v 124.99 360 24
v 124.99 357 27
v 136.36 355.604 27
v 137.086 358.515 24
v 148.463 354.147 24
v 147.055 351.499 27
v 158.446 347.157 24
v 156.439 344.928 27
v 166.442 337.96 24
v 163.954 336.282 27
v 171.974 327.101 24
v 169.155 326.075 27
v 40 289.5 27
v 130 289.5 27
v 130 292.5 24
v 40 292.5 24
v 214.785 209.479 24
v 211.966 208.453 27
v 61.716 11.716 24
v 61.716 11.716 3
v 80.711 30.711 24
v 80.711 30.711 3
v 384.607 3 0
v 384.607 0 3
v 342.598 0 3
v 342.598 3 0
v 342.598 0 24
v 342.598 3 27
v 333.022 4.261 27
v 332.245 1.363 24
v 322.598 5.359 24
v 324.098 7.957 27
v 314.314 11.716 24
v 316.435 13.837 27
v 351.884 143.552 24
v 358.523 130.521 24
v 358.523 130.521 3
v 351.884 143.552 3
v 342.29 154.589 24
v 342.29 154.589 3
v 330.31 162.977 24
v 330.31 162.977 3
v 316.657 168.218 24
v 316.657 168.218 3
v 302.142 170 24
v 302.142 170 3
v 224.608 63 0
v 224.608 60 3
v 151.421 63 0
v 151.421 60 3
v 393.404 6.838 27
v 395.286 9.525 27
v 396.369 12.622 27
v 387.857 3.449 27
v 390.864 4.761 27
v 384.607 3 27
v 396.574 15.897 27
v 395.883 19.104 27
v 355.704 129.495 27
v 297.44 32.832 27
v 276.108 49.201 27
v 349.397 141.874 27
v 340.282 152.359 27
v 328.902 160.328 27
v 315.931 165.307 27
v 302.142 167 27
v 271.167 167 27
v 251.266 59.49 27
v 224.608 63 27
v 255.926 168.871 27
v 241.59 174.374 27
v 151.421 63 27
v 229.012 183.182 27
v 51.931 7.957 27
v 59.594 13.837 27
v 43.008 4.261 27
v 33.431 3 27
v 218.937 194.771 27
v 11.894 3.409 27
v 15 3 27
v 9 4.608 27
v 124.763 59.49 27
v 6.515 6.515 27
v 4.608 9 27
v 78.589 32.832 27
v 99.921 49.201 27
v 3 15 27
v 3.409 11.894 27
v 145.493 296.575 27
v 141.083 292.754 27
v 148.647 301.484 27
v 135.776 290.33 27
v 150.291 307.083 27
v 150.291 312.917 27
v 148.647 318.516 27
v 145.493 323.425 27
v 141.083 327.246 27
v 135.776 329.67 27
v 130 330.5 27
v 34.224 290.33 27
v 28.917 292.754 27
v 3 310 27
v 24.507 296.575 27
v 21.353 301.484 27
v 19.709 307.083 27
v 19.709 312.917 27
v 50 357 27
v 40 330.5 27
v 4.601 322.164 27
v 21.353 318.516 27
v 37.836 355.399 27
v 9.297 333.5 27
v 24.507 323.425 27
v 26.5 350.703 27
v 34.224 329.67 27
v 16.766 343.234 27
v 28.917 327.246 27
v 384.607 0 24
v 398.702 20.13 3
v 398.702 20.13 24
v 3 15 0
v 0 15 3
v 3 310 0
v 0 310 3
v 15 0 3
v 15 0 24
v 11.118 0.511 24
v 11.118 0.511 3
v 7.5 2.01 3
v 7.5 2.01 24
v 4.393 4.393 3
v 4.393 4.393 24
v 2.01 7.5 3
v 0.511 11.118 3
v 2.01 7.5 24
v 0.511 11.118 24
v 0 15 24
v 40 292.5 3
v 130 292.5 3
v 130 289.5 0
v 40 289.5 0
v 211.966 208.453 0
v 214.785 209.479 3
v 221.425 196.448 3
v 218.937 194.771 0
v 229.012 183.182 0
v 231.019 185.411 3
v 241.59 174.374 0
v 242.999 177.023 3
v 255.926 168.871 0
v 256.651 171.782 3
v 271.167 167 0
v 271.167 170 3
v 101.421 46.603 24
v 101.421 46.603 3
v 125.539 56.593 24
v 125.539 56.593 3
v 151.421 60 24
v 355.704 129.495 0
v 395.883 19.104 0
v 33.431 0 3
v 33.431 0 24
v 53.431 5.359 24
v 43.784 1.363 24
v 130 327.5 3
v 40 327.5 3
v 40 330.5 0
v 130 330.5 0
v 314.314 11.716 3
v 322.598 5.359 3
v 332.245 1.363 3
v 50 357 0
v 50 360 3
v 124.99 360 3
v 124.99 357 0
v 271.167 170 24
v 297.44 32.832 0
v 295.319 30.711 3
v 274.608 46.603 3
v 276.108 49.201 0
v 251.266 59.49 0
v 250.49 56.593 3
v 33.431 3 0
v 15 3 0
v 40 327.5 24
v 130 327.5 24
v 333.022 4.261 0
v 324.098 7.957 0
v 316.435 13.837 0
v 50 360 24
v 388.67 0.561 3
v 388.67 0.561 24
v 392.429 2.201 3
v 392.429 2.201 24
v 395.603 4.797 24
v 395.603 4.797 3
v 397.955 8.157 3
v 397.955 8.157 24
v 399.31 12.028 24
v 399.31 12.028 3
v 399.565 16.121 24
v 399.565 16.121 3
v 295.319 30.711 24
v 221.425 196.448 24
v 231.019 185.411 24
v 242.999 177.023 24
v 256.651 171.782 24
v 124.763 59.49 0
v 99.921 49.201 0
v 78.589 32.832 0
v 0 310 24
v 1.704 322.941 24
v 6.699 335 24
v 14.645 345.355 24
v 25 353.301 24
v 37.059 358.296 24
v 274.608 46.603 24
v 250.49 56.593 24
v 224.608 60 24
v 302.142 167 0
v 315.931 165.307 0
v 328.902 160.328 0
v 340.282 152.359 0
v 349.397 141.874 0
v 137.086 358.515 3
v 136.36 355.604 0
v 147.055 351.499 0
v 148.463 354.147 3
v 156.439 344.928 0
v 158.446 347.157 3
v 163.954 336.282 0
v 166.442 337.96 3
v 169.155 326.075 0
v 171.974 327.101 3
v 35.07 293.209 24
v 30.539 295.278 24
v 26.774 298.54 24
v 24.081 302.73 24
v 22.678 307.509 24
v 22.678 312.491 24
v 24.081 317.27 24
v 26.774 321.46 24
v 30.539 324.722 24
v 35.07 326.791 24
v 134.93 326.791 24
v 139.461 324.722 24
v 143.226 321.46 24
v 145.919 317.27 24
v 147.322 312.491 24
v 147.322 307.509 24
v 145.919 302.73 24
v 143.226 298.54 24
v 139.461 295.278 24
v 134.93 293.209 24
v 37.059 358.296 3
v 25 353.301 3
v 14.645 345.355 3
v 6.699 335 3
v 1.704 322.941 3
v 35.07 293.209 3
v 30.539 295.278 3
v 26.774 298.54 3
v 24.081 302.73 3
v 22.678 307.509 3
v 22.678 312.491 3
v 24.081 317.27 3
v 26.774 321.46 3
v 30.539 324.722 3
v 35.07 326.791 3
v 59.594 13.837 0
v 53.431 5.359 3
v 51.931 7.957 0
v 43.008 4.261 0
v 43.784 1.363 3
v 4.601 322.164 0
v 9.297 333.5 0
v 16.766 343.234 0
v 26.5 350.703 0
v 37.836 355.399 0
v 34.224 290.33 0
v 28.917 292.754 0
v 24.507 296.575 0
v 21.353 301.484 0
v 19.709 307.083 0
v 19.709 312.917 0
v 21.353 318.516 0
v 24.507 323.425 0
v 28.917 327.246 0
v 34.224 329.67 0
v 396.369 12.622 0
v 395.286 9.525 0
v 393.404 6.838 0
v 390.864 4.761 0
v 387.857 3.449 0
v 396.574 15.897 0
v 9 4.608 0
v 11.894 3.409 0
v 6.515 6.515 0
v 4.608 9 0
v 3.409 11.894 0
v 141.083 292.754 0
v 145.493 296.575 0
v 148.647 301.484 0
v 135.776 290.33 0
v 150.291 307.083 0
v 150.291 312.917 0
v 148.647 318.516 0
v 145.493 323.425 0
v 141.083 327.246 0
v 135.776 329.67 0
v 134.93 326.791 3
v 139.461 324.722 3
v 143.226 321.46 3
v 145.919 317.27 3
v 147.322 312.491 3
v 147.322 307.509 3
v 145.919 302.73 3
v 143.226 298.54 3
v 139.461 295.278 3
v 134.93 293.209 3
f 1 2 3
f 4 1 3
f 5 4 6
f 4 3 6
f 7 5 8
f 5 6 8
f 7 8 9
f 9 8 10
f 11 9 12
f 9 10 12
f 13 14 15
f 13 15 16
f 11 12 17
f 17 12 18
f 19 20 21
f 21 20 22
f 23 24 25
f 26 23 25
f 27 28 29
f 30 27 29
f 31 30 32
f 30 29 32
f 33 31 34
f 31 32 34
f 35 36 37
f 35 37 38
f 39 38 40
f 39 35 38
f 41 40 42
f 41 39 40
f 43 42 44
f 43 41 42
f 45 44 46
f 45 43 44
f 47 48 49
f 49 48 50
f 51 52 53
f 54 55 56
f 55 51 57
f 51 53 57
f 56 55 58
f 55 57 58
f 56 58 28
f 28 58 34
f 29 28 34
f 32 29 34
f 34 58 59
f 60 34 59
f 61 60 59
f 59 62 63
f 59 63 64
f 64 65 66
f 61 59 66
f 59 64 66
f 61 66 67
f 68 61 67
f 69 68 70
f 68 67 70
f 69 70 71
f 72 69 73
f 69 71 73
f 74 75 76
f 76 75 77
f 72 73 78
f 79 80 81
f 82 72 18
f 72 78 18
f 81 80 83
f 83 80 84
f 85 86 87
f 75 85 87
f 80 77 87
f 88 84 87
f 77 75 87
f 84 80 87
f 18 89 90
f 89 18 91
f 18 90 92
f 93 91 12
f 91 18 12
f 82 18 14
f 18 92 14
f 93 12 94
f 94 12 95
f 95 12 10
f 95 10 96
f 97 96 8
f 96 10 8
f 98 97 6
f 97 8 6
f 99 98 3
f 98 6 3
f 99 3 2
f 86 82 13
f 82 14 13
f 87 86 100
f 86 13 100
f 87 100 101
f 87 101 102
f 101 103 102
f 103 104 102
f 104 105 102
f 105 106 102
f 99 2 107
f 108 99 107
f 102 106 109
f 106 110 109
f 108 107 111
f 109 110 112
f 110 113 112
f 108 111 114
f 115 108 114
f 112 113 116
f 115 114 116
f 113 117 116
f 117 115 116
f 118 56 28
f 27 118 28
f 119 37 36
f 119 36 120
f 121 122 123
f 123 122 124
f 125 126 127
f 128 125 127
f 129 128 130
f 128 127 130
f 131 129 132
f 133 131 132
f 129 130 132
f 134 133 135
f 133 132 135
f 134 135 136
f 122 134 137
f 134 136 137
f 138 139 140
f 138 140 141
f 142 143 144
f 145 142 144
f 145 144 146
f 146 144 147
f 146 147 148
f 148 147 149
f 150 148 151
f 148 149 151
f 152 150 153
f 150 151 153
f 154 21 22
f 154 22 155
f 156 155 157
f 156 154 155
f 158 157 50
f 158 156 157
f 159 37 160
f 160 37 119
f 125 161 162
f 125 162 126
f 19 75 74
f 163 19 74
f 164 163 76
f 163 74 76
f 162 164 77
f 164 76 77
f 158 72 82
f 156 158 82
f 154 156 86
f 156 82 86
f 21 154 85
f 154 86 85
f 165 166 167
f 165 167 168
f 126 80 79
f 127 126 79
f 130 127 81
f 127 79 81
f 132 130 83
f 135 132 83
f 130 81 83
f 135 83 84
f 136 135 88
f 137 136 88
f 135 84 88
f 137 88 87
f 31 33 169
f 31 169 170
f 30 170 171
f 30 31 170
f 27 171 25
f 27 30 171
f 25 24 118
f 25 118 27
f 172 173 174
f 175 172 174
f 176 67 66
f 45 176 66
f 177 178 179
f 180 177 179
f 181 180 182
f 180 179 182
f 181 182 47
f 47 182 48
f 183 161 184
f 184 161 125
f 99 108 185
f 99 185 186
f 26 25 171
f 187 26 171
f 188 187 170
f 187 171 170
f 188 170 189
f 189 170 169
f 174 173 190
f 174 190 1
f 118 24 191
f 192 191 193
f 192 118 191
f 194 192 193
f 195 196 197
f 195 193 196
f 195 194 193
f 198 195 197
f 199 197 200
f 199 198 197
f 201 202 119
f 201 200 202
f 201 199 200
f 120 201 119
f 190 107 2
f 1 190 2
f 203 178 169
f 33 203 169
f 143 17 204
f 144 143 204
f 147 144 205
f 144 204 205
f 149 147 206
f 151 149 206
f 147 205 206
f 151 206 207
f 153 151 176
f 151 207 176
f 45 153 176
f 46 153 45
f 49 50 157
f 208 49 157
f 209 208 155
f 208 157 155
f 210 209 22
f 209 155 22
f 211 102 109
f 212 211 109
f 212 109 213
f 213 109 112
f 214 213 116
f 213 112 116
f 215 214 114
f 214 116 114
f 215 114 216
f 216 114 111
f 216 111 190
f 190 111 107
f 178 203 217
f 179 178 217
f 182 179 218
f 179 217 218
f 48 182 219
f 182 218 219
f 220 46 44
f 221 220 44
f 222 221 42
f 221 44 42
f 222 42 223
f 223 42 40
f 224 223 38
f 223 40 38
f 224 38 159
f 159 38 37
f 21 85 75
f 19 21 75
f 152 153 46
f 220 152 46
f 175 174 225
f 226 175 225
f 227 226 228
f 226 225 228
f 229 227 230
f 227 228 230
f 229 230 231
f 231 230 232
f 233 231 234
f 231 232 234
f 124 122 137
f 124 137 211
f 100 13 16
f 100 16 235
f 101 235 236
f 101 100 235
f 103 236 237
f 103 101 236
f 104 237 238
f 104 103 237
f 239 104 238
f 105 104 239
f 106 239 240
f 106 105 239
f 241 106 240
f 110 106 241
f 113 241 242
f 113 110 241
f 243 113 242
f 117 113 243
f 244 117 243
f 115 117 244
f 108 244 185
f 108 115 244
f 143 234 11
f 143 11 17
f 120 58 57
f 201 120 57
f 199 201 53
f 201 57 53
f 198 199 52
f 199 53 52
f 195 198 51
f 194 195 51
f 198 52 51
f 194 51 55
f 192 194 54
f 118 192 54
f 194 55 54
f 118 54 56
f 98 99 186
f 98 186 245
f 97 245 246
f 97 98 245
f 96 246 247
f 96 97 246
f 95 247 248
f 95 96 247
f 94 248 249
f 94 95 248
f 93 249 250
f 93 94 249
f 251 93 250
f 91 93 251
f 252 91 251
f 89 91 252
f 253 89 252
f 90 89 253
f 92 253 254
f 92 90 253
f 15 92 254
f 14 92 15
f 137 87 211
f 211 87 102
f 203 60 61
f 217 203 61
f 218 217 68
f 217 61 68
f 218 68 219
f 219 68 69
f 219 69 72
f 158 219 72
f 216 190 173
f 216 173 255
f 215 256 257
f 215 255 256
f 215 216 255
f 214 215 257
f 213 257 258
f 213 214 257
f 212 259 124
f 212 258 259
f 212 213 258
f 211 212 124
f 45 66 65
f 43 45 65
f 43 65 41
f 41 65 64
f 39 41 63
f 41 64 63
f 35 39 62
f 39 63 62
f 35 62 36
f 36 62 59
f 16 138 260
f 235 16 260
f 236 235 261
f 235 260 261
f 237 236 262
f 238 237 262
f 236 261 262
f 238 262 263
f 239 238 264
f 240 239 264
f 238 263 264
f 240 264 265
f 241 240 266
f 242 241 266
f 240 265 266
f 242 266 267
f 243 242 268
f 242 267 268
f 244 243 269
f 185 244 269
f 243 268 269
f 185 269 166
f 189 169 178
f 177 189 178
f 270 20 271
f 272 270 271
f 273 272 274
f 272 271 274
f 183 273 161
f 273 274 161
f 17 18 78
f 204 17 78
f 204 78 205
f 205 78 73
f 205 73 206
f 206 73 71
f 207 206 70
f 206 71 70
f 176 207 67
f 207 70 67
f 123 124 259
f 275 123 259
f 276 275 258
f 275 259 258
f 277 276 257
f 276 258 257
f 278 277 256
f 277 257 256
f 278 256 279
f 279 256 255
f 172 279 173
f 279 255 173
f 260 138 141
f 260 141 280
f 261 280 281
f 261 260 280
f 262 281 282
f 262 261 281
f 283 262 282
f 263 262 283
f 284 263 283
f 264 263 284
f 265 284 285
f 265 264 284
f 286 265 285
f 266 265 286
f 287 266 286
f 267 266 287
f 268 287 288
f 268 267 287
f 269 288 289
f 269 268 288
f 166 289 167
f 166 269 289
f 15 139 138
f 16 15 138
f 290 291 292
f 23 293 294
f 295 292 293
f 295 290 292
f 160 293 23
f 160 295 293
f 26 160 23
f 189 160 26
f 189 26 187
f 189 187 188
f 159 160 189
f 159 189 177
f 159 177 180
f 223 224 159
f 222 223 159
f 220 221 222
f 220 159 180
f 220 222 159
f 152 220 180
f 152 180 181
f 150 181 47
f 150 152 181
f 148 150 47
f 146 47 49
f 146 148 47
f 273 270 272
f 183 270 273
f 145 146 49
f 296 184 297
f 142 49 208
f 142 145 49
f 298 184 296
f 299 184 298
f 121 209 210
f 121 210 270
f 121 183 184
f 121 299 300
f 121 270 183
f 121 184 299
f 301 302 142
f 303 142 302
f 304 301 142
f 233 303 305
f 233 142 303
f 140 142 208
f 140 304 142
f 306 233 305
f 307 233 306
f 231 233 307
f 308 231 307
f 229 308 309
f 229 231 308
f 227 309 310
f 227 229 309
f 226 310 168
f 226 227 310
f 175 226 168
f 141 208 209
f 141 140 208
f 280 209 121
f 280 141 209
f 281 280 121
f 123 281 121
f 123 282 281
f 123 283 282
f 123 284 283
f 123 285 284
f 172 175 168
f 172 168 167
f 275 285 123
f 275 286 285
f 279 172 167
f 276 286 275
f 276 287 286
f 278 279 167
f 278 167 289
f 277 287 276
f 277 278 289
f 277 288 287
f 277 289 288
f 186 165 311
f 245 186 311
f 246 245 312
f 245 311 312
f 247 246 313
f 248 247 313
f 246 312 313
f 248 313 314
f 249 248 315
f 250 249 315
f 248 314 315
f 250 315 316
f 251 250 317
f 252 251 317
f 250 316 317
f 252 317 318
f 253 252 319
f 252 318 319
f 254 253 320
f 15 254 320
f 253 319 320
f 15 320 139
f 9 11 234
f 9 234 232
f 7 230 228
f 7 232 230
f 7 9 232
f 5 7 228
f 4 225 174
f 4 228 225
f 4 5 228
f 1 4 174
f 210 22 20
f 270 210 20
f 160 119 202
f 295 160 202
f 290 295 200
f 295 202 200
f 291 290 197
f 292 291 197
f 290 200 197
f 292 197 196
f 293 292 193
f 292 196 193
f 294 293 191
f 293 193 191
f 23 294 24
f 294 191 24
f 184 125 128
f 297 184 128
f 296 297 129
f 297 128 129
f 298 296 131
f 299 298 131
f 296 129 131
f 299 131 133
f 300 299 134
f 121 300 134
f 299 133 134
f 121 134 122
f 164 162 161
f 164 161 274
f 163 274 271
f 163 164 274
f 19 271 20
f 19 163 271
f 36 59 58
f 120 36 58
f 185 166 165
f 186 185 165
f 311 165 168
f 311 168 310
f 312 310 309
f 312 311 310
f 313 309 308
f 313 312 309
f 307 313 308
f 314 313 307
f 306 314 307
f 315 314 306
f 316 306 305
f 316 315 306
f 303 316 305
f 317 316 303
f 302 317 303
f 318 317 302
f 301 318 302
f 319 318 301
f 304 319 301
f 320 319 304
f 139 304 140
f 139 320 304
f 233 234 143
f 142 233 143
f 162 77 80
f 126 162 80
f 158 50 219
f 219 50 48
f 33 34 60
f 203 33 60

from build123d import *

# Parameters (mm, degrees)
BOSS_EXTRU_1_DEPTH           = 27
ENL_V_MAT_EXTRU_1_DEPTH      = 544.312782602
ENL_V_MAT_EXTRU_1_DEPTH_BACK = 544.312782602
CONG_3_R                     = 60
CONG_4_R                     = 50
CONG_5_R                     = 100
CONG_6_R                     = 15
CONG_7_R                     = 40
ENL_V_MAT_EXTRU_2_DEPTH      = 539.530227365
ENL_V_MAT_EXTRU_2_DEPTH_BACK = 539.530227365
CHANFREIN1_SIZE              = 3


with BuildPart() as part:
    # Esquisse1 → Boss.-Extru.1 (new body)
    with BuildSketch(Plane.XY):
        Polygon((0, 0), (0, 360), (160, 360), (229.154344511, 170), (344.154344511, 170), (406.029284336, 0), align=None)
    extrude(amount=BOSS_EXTRU_1_DEPTH)

    # Esquisse2 → Enlèv. mat.-Extru.1 (cut, two sides: drawn at the far end of the back side and taken through both)
    with BuildSketch(Plane.XY.offset(27).offset(-ENL_V_MAT_EXTRU_1_DEPTH_BACK)):
        Polygon((50, 0), (110, 60), (266.029284336, 60), (326.029284336, 0), align=None)
    extrude(amount=ENL_V_MAT_EXTRU_1_DEPTH + ENL_V_MAT_EXTRU_1_DEPTH_BACK, mode=Mode.SUBTRACT)

    # Congé3
    cong_3_edges = [part.edges().sort_by_distance(p)[0] for p in [
        (229.154344511, 170, 13.5),
        (344.154344511, 170, 13.5),
    ]]
    fillet(cong_3_edges, radius=CONG_3_R)

    # Congé4
    cong_4_edges = [part.edges().sort_by_distance(p)[0] for p in [
        (0, 360, 13.5),
        (160, 360, 13.5),
    ]]
    fillet(cong_4_edges, radius=CONG_4_R)

    # Congé5
    cong_5_edges = [part.edges().sort_by_distance(p)[0] for p in [
        (110, 60, 13.5),
        (266.029284336, 60, 13.5),
    ]]
    fillet(cong_5_edges, radius=CONG_5_R)

    # Congé6
    cong_6_edges = [part.edges().sort_by_distance(p)[0] for p in [
        (0, 0, 13.5),
        (406.029284336, 0, 13.5),
    ]]
    fillet(cong_6_edges, radius=CONG_6_R)

    # Congé7
    cong_7_edges = [part.edges().sort_by_distance(p)[0] for p in [
        (326.029284336, 0, 13.5),
        (50, 0, 13.5),
    ]]
    fillet(cong_7_edges, radius=CONG_7_R)

    # Esquisse3 → Enlèv. mat.-Extru.2 (cut, two sides: drawn at the far end of the back side and taken through both)
    with BuildSketch(Plane.XY.offset(27).offset(-ENL_V_MAT_EXTRU_2_DEPTH_BACK)):
        with BuildLine():
            Line((40, 327.5), (130, 327.5))
            ThreePointArc((130, 327.5), (147.5, 310), (130, 292.5))
            Line((130, 292.5), (40, 292.5))
            ThreePointArc((40, 292.5), (22.5, 310), (40, 327.5))
        make_face()
    extrude(amount=ENL_V_MAT_EXTRU_2_DEPTH + ENL_V_MAT_EXTRU_2_DEPTH_BACK, mode=Mode.SUBTRACT)

    # Chanfrein1
    chanfrein1_edges = [part.edges().sort_by_distance(p)[0] for p in [
        (22.5, 310, 0),
        (85, 327.5, 0),
        (147.5, 310, 0),
        (85, 292.5, 0),
        (22.5, 310, 27),
        (85, 292.5, 27),
        (147.5, 310, 27),
        (85, 327.5, 27),
        (286.654344511, 170, 0),
        (286.654344511, 170, 27),
        (193.379746842, 268.289899283, 0),
        (336.556478399, 159.149122657, 0),
        (193.379746842, 268.289899283, 27),
        (336.556478399, 159.149122657, 27),
        (236.752210622, 180.850877343, 0),
        (236.752210622, 180.850877343, 27),
        (0, 162.5, 0),
        (0, 162.5, 27),
        (87.494811545, 360, 0),
        (153.668444907, 350.957602214, 0),
        (14.644660941, 345.355339059, 0),
        (87.494811545, 360, 27),
        (153.668444907, 350.957602214, 27),
        (14.644660941, 345.355339059, 27),
        (188.014642168, 60, 0),
        (188.014642168, 60, 27),
        (304.8160809, 21.213203436, 27),
        (71.213203436, 21.213203436, 0),
        (262.876271335, 52.387953251, 27),
        (262.876271335, 52.387953251, 0),
        (113.153013001, 52.387953251, 27),
        (113.153013001, 52.387953251, 0),
        (24.215728753, 0, 0),
        (24.215728753, 0, 27),
        (378.612951506, 75.325755375, 0),
        (396.894344899, 6.396353455, 0),
        (4.393398282, 4.393398282, 0),
        (378.612951506, 75.325755375, 27),
        (396.894344899, 6.396353455, 27),
        (4.393398282, 4.393398282, 27),
        (304.8160809, 21.213203436, 0),
        (71.213203436, 21.213203436, 27),
        (363.602445533, 0, 27),
        (48.7387948, 3.0448187, 27),
        (327.290489536, 3.0448187, 27),
        (363.602445533, 0, 0),
        (48.7387948, 3.0448187, 0),
        (327.290489536, 3.0448187, 0),
    ]]
    chamfer(chanfrein1_edges, length=CHANFREIN1_SIZE)


solid = part.part
